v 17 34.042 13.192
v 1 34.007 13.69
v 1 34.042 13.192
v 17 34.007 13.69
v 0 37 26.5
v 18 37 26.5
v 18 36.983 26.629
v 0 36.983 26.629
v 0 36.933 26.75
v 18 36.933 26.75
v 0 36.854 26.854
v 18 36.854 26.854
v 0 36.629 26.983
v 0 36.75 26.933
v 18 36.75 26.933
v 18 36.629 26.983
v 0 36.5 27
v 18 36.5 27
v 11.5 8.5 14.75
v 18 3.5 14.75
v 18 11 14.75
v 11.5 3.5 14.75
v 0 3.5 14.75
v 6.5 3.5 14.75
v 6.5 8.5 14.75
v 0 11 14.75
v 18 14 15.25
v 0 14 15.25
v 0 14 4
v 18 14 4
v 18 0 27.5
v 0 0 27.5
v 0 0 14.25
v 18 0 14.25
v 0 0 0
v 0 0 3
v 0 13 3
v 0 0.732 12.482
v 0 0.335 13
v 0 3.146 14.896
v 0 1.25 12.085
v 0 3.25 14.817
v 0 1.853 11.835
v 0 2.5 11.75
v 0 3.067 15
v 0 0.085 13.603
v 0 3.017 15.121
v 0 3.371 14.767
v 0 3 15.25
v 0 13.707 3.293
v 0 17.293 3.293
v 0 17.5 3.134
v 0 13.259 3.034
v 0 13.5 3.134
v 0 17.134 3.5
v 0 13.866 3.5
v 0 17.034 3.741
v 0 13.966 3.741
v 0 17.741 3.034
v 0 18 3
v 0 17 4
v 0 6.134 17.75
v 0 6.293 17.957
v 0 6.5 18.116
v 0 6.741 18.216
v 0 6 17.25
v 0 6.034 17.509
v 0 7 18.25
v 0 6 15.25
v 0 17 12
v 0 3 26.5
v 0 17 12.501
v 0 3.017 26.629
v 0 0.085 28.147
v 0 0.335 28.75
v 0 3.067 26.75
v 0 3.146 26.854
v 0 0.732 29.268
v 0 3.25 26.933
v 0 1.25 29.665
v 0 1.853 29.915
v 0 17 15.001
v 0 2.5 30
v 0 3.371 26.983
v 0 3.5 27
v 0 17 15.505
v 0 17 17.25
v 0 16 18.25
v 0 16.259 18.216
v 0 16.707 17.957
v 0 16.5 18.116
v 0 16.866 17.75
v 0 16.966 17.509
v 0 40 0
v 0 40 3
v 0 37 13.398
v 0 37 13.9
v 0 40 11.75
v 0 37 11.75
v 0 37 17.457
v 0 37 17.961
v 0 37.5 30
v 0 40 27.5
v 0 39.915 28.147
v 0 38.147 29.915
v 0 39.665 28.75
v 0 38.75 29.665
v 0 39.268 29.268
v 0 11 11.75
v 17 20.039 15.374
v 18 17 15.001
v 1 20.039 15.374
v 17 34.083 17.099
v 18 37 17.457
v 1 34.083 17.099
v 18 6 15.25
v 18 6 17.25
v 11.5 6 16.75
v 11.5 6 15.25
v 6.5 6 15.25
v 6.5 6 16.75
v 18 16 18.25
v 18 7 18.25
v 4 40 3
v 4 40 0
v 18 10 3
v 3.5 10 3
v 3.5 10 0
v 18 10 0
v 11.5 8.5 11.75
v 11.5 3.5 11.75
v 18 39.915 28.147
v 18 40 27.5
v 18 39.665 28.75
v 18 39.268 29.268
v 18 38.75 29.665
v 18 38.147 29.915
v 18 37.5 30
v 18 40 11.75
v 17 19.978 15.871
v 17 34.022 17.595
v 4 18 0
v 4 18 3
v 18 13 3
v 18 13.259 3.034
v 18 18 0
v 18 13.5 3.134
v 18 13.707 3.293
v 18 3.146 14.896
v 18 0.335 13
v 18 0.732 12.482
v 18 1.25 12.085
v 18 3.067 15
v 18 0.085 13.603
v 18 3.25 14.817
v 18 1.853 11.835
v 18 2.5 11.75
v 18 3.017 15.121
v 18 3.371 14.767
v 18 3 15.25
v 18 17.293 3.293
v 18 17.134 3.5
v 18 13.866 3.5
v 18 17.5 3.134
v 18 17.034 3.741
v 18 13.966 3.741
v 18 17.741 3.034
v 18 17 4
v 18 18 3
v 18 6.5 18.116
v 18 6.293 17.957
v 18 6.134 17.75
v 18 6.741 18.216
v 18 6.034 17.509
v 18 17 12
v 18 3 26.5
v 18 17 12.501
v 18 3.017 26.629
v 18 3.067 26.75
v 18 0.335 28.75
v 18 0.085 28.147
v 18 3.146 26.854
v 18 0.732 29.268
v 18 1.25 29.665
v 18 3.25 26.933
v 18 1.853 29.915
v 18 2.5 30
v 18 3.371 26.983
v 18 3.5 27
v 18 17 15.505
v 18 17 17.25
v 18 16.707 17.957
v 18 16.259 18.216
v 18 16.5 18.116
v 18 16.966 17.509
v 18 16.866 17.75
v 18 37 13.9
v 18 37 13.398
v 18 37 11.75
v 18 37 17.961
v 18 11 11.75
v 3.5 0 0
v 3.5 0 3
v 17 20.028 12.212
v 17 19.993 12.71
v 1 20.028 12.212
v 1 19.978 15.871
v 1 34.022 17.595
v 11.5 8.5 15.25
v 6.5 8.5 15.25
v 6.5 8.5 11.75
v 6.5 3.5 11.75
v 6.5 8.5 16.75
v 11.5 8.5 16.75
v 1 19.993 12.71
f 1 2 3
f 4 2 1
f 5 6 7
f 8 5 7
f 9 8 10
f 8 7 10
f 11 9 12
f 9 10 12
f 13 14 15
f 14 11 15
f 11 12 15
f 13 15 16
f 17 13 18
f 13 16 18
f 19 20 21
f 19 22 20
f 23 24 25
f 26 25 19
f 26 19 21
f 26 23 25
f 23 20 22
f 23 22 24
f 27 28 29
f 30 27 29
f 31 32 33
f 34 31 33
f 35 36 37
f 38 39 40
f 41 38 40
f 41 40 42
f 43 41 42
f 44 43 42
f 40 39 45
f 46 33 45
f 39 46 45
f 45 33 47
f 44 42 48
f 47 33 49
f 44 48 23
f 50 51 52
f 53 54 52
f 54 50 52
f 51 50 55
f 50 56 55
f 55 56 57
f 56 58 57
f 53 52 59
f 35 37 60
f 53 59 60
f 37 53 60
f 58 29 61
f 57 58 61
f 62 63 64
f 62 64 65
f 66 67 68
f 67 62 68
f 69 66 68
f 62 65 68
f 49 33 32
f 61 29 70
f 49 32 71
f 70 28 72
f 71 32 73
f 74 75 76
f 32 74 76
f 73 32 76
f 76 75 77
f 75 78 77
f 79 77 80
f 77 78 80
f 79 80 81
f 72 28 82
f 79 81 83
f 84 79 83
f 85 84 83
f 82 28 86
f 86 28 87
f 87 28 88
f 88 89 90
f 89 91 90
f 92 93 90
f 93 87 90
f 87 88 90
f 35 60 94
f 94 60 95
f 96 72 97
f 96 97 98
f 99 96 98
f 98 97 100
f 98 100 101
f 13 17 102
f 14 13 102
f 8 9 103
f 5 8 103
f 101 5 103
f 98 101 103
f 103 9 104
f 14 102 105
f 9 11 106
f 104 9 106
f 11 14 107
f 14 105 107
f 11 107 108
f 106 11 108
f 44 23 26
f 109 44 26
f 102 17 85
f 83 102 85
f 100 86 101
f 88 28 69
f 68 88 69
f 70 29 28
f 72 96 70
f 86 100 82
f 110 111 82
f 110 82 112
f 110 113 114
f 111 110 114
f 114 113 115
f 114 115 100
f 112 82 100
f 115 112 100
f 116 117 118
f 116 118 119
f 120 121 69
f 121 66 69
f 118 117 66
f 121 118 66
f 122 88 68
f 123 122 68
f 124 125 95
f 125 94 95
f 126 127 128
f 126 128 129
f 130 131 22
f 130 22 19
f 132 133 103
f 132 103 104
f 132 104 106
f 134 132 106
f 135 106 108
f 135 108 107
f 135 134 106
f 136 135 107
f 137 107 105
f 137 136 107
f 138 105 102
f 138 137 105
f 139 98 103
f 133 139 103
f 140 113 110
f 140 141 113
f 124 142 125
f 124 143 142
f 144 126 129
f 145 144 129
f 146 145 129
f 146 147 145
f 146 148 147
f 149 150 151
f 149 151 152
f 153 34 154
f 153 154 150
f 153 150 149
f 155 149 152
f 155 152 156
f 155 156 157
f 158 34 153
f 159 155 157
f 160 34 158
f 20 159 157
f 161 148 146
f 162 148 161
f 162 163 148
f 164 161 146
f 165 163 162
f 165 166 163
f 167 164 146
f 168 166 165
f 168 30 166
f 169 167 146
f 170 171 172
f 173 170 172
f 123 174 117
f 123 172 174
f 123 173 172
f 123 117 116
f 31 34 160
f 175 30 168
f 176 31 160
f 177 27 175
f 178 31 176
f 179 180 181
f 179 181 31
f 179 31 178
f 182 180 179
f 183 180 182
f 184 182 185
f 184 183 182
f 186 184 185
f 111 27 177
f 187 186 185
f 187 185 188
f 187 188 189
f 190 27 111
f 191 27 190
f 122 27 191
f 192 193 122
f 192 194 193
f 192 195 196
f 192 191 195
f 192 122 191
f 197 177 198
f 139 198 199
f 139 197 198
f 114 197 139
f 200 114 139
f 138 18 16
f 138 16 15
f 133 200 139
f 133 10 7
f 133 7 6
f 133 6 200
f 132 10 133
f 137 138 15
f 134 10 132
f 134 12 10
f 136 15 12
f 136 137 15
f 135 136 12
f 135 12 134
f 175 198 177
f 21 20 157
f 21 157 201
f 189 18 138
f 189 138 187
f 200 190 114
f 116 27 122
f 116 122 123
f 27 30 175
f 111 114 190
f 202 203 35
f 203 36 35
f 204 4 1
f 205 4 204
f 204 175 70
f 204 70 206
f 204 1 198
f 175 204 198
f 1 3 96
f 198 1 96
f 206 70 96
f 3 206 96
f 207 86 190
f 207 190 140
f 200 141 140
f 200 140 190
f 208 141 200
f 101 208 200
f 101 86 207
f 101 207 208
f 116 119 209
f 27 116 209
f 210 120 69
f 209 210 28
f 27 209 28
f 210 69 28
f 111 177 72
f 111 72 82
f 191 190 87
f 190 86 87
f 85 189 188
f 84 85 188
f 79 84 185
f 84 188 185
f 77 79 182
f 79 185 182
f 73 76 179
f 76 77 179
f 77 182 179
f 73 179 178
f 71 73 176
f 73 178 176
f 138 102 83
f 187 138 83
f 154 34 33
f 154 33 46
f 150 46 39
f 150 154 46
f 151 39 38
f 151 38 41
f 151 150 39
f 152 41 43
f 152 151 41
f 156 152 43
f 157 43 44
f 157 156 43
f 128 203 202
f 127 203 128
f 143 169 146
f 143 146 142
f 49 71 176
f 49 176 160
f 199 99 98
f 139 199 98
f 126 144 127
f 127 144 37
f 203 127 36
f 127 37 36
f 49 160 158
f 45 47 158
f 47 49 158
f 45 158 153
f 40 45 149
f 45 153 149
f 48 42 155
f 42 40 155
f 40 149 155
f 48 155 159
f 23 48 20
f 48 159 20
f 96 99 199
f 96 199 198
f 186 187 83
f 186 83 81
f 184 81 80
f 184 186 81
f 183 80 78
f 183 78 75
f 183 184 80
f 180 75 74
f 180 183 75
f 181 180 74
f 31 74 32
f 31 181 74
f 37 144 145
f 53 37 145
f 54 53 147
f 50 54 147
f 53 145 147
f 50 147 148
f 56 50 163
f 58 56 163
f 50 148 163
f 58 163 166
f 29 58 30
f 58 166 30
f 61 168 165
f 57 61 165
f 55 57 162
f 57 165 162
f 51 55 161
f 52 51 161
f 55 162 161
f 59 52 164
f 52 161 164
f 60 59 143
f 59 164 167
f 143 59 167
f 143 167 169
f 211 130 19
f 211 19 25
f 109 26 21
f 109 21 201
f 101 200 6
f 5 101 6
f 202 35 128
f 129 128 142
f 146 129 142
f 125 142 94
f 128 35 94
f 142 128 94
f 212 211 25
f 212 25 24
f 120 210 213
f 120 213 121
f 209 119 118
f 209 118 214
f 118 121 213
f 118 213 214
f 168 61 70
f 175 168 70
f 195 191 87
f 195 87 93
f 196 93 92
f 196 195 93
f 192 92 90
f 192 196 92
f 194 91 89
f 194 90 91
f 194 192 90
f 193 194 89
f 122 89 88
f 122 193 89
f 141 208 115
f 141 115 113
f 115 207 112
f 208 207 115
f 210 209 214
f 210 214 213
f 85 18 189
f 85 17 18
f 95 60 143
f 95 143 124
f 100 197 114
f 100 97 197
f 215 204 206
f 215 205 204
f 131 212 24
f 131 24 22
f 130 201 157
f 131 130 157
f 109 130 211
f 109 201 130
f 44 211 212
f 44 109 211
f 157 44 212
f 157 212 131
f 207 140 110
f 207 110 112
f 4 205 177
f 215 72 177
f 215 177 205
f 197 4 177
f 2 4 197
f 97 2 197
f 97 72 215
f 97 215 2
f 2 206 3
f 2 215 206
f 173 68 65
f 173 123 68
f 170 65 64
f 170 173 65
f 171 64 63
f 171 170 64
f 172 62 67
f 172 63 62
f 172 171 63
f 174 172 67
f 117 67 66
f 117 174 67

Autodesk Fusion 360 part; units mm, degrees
sketch "Sketch2" plane through (0, 0, 0) normal (1, 0, 0) x (0, 1, 0)
  line L0 (0, 0) -> (40, 0)
  line L1 (40, 0) -> (40, 30)
  line L2 (40, 30) -> (0, 30)
  line L3 (0, 30) -> (0, 0)
  line L4 (3, 3) -> (37, 3)
  line L5 (37, 3) -> (37, 27)
  line L6 (37, 27) -> (3, 27)
  line L7 (3, 27) -> (3, 3)
  line L8 (17, 3) -> (17, 18.25)
  line L9 (17, 18.25) -> (6, 18.25)
  line L10 (6, 18.25) -> (6, 15.25)
  line L11 (6, 15.25) -> (14, 15.25)
  line L12 (14, 15.25) -> (14, 3)
  line L13 (3, 14.75) -> (11, 14.75)
  line L14 (11, 14.75) -> (11, 11.75)
  line L15 (11, 11.75) -> (3, 11.75)
  line L16 (3, 11.75) -> (0, 11.75)
  line L17 (37, 11.75) -> (40, 11.75)
  line L18 (17, 12) -> (37, 13.3985)
  line L19 (17, 12.5012) -> (37, 13.8998)
  line L20 (17, 15.0012) -> (37, 17.4569)
  line L21 (17, 15.505) -> (37, 17.9607)
  line L22 (3, 3) -> (0, 3)
  line L23 (37, 3) -> (40, 3)
  dimension "d1" = -3
  dimension "d2" = 30
  dimension "d3" = 40
  dimension "d4" = 3
  dimension "d5" = 3
  dimension "d6" = 3
  dimension "d7" = 0.5
  dimension "d8" = 3
  dimension "d9" = 14
  dimension "d10" = 3
  dimension "d11" = 8.75
  dimension "d12" = 0.5
  dimension "d13" = 0.5
  dimension "d14" = 94
  dimension "d15" = 97
  dimension "d16" = 2.5
  dimension "d17" = 9
extrude "Extrude1" add sketch "Sketch2" along normal blind 18 contours L0 L1 L3 L4 L22 L23 | L1 L2 L3 L5 L6 L7 L16 L17 | L7 L13 L14 L15 | L4 L8 L9 L10 L11 L12 | L5 L8 L18 L19 | L5 L8 L20 L21
sketch "Sketch3" plane through (0, 0, 11.75) normal (0, 0, -1) x (1, 0, 0)
  line L0 (0, 0) -> (0, -11)
  line L1 (0, -11) -> (18, -11)
  line L2 (18, -11) -> (18, 0)
  line L3 (18, 0) -> (0, 0)
  line L4 (9, 0) -> (9, -6)
  line L5 (11.5, -8.5) -> (6.5, -8.5)
  line L6 (6.5, -8.5) -> (6.5, -3.5)
  line L7 (6.5, -3.5) -> (11.5, -3.5)
  line L8 (11.5, -3.5) -> (11.5, -8.5)
  line L9 (11.5, -8.5) -> (6.5, -3.5) construction
  line L10 (6.5, -8.5) -> (11.5, -3.5) construction
  point P0 (9, -6)
  dimension "d24" = 5
  dimension "d25" = 5
  dimension "d26" = 6
extrude "Extrude2" cut sketch "Sketch3" against normal blind 5 contours L5 L6 L7 L8
sketch "Sketch6" plane through (0, -1.623, 13.2184) normal (0, -0.1219, 0.9925) x (1, 0, 0)
  line L0 (0, 38.9131) -> (0, 18.7629)
  line L1 (0, 18.7629) -> (18, 18.7629)
  line L2 (18, 18.7629) -> (18, 38.9131)
  line L3 (18, 38.9131) -> (0, 38.9131)
  line L4 (0, 38.9131) -> (18, 38.9131)
  line L5 (18, 38.9131) -> (18, 18.7629)
  line L6 (18, 18.7629) -> (0, 18.7629)
  line L7 (0, 18.7629) -> (0, 38.9131)
  line L8 (1, 35.9131) -> (17, 35.9131)
  line L9 (17, 35.9131) -> (17, 21.7629)
  line L10 (17, 21.7629) -> (1, 21.7629)
  line L11 (1, 21.7629) -> (1, 35.9131)
  dimension "d34" = 1
  dimension "d35" = 1
  dimension "d36" = 3
  dimension "d37" = 3
sketch "Sketch7" plane through (0, -0.7872, 11.2574) normal (0, -0.0698, 0.9976) x (1, 0, 0)
  line L0 (0, 37.8795) -> (0, 17.8306)
  line L1 (0, 17.8306) -> (18, 17.8306)
  line L2 (18, 17.8306) -> (18, 37.8795)
  line L3 (18, 37.8795) -> (0, 37.8795)
  line L4 (0, 37.8795) -> (18, 37.8795)
  line L5 (18, 37.8795) -> (18, 17.8306)
  line L6 (18, 17.8306) -> (0, 17.8306)
  line L7 (0, 17.8306) -> (0, 37.8795)
  line L8 (1, 34.8795) -> (17, 34.8795)
  line L9 (17, 34.8795) -> (17, 20.8306)
  line L10 (17, 20.8306) -> (1, 20.8306)
  line L11 (1, 20.8306) -> (1, 34.8795)
  dimension "d38" = 1
  dimension "d39" = 1
  dimension "d40" = 3
  dimension "d41" = 3
extrude "Extrude5" cut sketch "Sketch6" against normal blind 1 contours L8 L9 L10 L11
extrude "Extrude6" cut sketch "Sketch7" against normal blind 1 contours L8 L9 L10 L11
fillet "Fillet1" radius 2.5 3 edges at (9, 0, 30) (9, 40, 30) (9, 0, 11.75)
fillet "Fillet1" radius 0.5 3 edges at (9, 3, 14.75) (9, 37, 27) (9, 3, 27)
fillet "Fillet2" radius 1 2 edges at (9, 14, 3) (9, 17, 3)
fillet "Fillet3" radius 1 2 edges at (9, 6, 18.25) (9, 17, 18.25)
sketch "Sketch4" plane through (0, 0, 3) normal (0, 0, 1) x (-1, 0, 0)
  line L0 (0, -13) -> (0, 0)
  line L1 (0, 0) -> (-18, 0)
  line L2 (-18, 0) -> (-18, -13)
  line L3 (-3.5, -10) -> (-14.5, -10)
  line L4 (-14.5, -10) -> (-14.5, 10)
  line L5 (-14.5, 10) -> (-3.5, 10)
  line L6 (-3.5, 10) -> (-3.5, -10)
  line L7 (-3.5, -10) -> (-14.5, 10) construction
  line L8 (-14.5, -10) -> (-3.5, 10) construction
  line L9 (-14.5, -10) -> (-18, -10)
  line L10 (-18, -13) -> (0, -13)
  point P0 (-9, 0)
  dimension "d27" = 11
  dimension "d28" = 20
extrude "Extrude3" cut sketch "Sketch4" against normal blind 6 contours L1 L3 L4 L6 | L1 L2 L4 L9
sketch "Sketch5" plane through (0, 0, 3) normal (0, 0, 1) x (-1, 0, 0)
  line L0 (0, -40) -> (0, -18)
  line L1 (-18, -18) -> (-18, -40)
  line L2 (-18, -40) -> (0, -40)
  line L3 (-18, -18) -> (-4, -18)
  line L4 (-4, -18) -> (-4, -40)
  line L5 (-4, -40) -> (-18, -40)
  line L6 (-18, -40) -> (-18, -18)
  line L7 (0, -18) -> (-18, -18)
  dimension "d31" = 14
extrude "Extrude4" cut sketch "Sketch5" against normal blind 5 contours L1 L2 L3 L4 L5 L6 L7
